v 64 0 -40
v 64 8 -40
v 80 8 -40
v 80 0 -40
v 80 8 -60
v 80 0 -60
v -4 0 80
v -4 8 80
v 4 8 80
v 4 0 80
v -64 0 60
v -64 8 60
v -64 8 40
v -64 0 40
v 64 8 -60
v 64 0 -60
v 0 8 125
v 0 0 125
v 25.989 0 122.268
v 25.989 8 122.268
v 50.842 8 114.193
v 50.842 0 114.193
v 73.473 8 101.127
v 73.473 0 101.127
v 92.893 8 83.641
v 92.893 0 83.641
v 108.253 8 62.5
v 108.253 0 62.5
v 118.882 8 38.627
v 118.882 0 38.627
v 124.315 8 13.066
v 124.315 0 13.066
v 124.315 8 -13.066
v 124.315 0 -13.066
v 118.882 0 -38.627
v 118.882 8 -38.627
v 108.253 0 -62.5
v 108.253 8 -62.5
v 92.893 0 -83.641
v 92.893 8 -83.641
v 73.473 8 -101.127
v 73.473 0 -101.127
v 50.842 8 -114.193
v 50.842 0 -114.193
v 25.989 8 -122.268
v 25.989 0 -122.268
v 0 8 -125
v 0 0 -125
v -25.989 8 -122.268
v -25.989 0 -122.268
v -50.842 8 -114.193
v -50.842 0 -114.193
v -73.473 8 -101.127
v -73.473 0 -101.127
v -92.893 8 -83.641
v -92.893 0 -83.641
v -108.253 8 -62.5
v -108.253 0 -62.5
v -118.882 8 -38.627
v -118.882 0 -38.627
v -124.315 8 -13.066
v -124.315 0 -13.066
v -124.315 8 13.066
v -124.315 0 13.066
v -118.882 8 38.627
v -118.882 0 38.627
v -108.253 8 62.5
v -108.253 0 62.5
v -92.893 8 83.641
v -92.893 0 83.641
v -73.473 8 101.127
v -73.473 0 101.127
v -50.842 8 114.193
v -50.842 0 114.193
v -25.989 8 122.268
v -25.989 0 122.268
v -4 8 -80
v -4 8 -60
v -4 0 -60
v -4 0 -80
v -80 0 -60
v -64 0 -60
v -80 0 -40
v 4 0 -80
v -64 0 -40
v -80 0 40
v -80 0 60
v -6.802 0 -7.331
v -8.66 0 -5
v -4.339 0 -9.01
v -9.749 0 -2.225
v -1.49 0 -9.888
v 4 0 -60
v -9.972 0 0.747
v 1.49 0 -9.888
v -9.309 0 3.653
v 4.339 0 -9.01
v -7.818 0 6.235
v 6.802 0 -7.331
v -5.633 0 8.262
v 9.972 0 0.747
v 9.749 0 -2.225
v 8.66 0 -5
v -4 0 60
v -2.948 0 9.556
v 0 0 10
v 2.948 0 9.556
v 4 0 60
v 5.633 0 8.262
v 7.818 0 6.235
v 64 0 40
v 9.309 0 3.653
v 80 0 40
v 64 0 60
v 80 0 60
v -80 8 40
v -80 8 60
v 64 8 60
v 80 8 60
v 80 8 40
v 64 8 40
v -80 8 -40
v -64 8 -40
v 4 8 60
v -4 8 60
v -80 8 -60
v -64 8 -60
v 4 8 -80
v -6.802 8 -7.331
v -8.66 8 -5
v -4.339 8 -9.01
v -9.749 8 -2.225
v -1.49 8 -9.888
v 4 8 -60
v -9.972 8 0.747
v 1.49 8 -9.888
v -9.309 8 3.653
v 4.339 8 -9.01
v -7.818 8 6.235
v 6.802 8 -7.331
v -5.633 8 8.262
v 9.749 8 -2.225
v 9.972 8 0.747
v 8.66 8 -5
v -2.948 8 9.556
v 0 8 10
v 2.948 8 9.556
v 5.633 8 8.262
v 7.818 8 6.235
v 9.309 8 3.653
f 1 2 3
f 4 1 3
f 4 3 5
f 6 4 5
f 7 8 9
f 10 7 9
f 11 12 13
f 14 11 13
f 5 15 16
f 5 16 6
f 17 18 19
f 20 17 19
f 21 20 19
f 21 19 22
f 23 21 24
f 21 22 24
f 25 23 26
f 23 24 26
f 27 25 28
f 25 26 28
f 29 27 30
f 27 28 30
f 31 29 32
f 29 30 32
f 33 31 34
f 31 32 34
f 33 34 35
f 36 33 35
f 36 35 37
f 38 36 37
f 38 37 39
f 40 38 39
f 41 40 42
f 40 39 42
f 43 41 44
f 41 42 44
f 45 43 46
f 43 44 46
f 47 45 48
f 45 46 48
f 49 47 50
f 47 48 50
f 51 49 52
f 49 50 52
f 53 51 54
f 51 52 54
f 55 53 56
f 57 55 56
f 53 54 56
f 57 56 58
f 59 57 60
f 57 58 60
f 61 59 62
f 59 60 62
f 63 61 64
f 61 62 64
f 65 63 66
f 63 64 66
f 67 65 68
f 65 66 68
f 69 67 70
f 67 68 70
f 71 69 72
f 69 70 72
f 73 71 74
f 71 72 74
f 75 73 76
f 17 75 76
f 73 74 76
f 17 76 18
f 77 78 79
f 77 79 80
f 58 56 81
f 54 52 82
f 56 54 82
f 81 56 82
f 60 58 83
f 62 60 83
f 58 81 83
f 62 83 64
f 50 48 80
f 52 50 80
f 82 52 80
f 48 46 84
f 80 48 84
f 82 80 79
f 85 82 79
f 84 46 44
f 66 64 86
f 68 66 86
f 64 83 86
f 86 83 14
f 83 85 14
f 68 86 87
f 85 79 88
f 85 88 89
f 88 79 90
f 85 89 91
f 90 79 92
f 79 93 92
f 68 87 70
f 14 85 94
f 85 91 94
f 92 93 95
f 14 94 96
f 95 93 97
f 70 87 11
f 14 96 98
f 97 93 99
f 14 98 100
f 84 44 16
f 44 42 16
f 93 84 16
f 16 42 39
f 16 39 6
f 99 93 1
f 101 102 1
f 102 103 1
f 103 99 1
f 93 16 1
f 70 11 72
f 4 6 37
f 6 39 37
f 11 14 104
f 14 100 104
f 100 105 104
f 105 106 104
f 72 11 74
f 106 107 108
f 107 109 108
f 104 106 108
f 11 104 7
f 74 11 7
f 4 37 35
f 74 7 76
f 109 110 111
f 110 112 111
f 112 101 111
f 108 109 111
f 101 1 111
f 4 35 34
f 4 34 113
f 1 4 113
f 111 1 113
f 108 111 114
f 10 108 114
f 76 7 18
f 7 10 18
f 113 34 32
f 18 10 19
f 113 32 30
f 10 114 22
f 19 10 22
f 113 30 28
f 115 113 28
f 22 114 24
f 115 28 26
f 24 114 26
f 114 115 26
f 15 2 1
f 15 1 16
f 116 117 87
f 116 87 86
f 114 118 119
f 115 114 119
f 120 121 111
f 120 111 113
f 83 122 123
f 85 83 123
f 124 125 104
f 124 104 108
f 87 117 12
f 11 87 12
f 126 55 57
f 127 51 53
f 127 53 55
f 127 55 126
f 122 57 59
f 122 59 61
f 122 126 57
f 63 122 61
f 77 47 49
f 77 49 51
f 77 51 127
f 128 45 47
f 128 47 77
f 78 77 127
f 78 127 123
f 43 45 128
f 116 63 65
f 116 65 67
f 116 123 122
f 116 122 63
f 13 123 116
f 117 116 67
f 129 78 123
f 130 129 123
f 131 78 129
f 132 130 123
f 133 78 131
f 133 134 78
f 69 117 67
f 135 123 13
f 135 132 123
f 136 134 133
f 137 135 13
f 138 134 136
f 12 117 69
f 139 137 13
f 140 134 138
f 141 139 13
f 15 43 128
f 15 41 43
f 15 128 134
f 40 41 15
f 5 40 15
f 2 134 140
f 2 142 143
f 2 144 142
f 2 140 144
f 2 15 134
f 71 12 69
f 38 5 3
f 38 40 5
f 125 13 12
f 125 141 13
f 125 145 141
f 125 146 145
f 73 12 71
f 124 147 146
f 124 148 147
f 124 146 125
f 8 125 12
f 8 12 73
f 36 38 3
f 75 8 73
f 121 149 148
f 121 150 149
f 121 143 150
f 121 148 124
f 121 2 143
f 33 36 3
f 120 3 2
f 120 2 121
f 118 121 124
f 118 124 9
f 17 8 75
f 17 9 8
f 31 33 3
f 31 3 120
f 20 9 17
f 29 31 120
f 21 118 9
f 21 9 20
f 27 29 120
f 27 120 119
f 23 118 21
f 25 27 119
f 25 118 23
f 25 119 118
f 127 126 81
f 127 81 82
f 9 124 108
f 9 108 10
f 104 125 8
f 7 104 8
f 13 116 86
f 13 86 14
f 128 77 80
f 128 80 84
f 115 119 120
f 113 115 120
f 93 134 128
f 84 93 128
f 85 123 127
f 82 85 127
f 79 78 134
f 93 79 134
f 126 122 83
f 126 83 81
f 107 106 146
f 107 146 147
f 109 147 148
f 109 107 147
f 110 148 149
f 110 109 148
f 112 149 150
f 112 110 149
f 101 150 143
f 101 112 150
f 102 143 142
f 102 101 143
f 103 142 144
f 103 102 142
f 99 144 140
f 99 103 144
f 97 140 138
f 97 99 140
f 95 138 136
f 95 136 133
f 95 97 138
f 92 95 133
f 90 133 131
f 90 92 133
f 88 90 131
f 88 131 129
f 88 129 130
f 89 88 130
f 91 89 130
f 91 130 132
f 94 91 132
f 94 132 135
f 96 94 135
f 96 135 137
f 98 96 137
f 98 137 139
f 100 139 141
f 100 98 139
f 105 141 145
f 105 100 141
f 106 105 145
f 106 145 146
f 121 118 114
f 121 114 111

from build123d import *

# Parameters (mm, degrees)
SKETCH1_R            = 125
SKETCH1_R_2          = 10
BOSS_EXTRUDE1_DEPTH  = 8
SKETCH2_W            = 16
SKETCH2_H            = 20
CUT_EXTRUDE1_DEPTH   = 10
LPATTERN1_COUNT      = 2
LPATTERN1_PITCH      = 144
LPATTERN1_COUNT_DIR2 = 2
LPATTERN1_PITCH_DIR2 = 100
SKETCH3_W            = 8
SKETCH3_H            = 20
CUT_EXTRUDE2_DEPTH   = 8


with BuildPart() as part:
    # Sketch1 → Boss-Extrude1 (new body)
    with BuildSketch(Plane(origin=(0, 0, 0), x_dir=(1, 0, 0), z_dir=(0, 1, 0))):
        with Locations(Location((0, 0, 0), (0, 0, 270))):
            Circle(SKETCH1_R)
        with Locations(Location((0, 0, 0), (0, 0, 270))):
            Circle(SKETCH1_R_2, mode=Mode.SUBTRACT)
    extrude(amount=BOSS_EXTRUDE1_DEPTH)

    # Sketch2 → Cut-Extrude1 (cut)
    with BuildSketch(Plane(origin=(0, 8, 0), x_dir=(1, 0, 0), z_dir=(0, 1, 0))):
        with Locations((-72, 50)):
            Rectangle(SKETCH2_W, SKETCH2_H)
    cut_extrude1 = extrude(amount=-CUT_EXTRUDE1_DEPTH, mode=Mode.SUBTRACT)

    # LPattern1: Cut-Extrude1 2 × 2
    with Locations(*[(i * LPATTERN1_PITCH, 0, j * LPATTERN1_PITCH_DIR2) for i in range(LPATTERN1_COUNT) for j in range(LPATTERN1_COUNT_DIR2) if (i, j) != (0, 0)]):
        add(cut_extrude1, mode=Mode.SUBTRACT)

    # Sketch3 → Cut-Extrude2 (cut)
    with BuildSketch(Plane(origin=(0, 8, 0), x_dir=(1, 0, 0), z_dir=(0, 1, 0))):
        with Locations((0, 70)):
            Rectangle(SKETCH3_W, SKETCH3_H)
    cut_extrude2 = extrude(amount=-CUT_EXTRUDE2_DEPTH, mode=Mode.SUBTRACT)

    # Mirror1: Cut-Extrude2 across plane
    add(cut_extrude2.mirror(Plane.XY), mode=Mode.SUBTRACT)


solid = part.part
